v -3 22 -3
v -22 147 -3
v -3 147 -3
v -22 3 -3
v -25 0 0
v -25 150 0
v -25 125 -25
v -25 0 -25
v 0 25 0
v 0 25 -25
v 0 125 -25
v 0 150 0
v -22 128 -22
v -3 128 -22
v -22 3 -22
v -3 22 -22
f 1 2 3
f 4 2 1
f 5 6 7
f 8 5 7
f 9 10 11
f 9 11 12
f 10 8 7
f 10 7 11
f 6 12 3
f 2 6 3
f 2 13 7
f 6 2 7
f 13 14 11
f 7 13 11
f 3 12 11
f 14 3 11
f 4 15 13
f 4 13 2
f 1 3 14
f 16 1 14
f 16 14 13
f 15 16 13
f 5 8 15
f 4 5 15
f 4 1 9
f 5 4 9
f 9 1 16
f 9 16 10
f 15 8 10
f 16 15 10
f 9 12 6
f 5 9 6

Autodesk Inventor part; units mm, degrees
ref_plane "YZ Plane" through (0, 0, 0) normal (1, 0, 0) x (0, 1, 0)
ref_plane "XZ Plane" through (0, 0, 0) normal (0, 1, 0) x (-1, 0, 0)
ref_plane "XY Plane" through (0, 0, 0) normal (0, 0, 1) x (1, 0, 0)
sketch "Sketch1" plane through (0, 0, 0) normal (0, 1, 0) x (-1, 0, 0)
  line L0 (0, 0) -> (25, 0)
  line L1 (25, 0) -> (25, -25)
  line L2 (25, -25) -> (0, -25)
  line L3 (0, -25) -> (0, 0)
  line L4 (22, -22) -> (22, -3)
  line L5 (22, -3) -> (3, -3)
  line L6 (3, -3) -> (3, -22)
  line L7 (3, -22) -> (22, -22)
  dimension "d0" = 25
  dimension "d1" = 25
  dimension "d2" = 3
extrude "Extrusion1" add sketch "Sketch1" along normal blind 150
sketch "Sketch2" plane through (0, 0, 0) normal (1, 0, 0) x (0, 0, -1)
  line L0 (0, 0) -> (25, 0) projected
  line L1 (25, 0) -> (25, 150) projected
  line L2 (0, 150) -> (25, 150) projected
  line L3 (0, 0) -> (0, 150) projected
  line L4 (0, 0) -> (0, 150) projected
  line L5 (0, 150) -> (25, 125)
  line L6 (0, 150) -> (35.3553, 150) construction
  dimension "d5" = 45
extrude "Extrusion2" cut sketch "Sketch2" against normal blind 80 contours L2 L1 L5
sketch "Sketch3" plane through (0, 0, -25) normal (0, 0, -1) x (-1, 0, 0)
  line L0 (25, 125) -> (0, 125) projected
  line L1 (0, 0) -> (0, 125) projected
  line L2 (0, 0) -> (25, 0) projected
  line L3 (25, 0) -> (25, 125) projected
  line L4 (25, 0) -> (0, 25)
  dimension "d11" = 45
extrude "Extrusion3" cut sketch "Sketch3" against normal blind 100 contours L2 L1 L4
properties part number "P405" material "Aluminum 6061"
